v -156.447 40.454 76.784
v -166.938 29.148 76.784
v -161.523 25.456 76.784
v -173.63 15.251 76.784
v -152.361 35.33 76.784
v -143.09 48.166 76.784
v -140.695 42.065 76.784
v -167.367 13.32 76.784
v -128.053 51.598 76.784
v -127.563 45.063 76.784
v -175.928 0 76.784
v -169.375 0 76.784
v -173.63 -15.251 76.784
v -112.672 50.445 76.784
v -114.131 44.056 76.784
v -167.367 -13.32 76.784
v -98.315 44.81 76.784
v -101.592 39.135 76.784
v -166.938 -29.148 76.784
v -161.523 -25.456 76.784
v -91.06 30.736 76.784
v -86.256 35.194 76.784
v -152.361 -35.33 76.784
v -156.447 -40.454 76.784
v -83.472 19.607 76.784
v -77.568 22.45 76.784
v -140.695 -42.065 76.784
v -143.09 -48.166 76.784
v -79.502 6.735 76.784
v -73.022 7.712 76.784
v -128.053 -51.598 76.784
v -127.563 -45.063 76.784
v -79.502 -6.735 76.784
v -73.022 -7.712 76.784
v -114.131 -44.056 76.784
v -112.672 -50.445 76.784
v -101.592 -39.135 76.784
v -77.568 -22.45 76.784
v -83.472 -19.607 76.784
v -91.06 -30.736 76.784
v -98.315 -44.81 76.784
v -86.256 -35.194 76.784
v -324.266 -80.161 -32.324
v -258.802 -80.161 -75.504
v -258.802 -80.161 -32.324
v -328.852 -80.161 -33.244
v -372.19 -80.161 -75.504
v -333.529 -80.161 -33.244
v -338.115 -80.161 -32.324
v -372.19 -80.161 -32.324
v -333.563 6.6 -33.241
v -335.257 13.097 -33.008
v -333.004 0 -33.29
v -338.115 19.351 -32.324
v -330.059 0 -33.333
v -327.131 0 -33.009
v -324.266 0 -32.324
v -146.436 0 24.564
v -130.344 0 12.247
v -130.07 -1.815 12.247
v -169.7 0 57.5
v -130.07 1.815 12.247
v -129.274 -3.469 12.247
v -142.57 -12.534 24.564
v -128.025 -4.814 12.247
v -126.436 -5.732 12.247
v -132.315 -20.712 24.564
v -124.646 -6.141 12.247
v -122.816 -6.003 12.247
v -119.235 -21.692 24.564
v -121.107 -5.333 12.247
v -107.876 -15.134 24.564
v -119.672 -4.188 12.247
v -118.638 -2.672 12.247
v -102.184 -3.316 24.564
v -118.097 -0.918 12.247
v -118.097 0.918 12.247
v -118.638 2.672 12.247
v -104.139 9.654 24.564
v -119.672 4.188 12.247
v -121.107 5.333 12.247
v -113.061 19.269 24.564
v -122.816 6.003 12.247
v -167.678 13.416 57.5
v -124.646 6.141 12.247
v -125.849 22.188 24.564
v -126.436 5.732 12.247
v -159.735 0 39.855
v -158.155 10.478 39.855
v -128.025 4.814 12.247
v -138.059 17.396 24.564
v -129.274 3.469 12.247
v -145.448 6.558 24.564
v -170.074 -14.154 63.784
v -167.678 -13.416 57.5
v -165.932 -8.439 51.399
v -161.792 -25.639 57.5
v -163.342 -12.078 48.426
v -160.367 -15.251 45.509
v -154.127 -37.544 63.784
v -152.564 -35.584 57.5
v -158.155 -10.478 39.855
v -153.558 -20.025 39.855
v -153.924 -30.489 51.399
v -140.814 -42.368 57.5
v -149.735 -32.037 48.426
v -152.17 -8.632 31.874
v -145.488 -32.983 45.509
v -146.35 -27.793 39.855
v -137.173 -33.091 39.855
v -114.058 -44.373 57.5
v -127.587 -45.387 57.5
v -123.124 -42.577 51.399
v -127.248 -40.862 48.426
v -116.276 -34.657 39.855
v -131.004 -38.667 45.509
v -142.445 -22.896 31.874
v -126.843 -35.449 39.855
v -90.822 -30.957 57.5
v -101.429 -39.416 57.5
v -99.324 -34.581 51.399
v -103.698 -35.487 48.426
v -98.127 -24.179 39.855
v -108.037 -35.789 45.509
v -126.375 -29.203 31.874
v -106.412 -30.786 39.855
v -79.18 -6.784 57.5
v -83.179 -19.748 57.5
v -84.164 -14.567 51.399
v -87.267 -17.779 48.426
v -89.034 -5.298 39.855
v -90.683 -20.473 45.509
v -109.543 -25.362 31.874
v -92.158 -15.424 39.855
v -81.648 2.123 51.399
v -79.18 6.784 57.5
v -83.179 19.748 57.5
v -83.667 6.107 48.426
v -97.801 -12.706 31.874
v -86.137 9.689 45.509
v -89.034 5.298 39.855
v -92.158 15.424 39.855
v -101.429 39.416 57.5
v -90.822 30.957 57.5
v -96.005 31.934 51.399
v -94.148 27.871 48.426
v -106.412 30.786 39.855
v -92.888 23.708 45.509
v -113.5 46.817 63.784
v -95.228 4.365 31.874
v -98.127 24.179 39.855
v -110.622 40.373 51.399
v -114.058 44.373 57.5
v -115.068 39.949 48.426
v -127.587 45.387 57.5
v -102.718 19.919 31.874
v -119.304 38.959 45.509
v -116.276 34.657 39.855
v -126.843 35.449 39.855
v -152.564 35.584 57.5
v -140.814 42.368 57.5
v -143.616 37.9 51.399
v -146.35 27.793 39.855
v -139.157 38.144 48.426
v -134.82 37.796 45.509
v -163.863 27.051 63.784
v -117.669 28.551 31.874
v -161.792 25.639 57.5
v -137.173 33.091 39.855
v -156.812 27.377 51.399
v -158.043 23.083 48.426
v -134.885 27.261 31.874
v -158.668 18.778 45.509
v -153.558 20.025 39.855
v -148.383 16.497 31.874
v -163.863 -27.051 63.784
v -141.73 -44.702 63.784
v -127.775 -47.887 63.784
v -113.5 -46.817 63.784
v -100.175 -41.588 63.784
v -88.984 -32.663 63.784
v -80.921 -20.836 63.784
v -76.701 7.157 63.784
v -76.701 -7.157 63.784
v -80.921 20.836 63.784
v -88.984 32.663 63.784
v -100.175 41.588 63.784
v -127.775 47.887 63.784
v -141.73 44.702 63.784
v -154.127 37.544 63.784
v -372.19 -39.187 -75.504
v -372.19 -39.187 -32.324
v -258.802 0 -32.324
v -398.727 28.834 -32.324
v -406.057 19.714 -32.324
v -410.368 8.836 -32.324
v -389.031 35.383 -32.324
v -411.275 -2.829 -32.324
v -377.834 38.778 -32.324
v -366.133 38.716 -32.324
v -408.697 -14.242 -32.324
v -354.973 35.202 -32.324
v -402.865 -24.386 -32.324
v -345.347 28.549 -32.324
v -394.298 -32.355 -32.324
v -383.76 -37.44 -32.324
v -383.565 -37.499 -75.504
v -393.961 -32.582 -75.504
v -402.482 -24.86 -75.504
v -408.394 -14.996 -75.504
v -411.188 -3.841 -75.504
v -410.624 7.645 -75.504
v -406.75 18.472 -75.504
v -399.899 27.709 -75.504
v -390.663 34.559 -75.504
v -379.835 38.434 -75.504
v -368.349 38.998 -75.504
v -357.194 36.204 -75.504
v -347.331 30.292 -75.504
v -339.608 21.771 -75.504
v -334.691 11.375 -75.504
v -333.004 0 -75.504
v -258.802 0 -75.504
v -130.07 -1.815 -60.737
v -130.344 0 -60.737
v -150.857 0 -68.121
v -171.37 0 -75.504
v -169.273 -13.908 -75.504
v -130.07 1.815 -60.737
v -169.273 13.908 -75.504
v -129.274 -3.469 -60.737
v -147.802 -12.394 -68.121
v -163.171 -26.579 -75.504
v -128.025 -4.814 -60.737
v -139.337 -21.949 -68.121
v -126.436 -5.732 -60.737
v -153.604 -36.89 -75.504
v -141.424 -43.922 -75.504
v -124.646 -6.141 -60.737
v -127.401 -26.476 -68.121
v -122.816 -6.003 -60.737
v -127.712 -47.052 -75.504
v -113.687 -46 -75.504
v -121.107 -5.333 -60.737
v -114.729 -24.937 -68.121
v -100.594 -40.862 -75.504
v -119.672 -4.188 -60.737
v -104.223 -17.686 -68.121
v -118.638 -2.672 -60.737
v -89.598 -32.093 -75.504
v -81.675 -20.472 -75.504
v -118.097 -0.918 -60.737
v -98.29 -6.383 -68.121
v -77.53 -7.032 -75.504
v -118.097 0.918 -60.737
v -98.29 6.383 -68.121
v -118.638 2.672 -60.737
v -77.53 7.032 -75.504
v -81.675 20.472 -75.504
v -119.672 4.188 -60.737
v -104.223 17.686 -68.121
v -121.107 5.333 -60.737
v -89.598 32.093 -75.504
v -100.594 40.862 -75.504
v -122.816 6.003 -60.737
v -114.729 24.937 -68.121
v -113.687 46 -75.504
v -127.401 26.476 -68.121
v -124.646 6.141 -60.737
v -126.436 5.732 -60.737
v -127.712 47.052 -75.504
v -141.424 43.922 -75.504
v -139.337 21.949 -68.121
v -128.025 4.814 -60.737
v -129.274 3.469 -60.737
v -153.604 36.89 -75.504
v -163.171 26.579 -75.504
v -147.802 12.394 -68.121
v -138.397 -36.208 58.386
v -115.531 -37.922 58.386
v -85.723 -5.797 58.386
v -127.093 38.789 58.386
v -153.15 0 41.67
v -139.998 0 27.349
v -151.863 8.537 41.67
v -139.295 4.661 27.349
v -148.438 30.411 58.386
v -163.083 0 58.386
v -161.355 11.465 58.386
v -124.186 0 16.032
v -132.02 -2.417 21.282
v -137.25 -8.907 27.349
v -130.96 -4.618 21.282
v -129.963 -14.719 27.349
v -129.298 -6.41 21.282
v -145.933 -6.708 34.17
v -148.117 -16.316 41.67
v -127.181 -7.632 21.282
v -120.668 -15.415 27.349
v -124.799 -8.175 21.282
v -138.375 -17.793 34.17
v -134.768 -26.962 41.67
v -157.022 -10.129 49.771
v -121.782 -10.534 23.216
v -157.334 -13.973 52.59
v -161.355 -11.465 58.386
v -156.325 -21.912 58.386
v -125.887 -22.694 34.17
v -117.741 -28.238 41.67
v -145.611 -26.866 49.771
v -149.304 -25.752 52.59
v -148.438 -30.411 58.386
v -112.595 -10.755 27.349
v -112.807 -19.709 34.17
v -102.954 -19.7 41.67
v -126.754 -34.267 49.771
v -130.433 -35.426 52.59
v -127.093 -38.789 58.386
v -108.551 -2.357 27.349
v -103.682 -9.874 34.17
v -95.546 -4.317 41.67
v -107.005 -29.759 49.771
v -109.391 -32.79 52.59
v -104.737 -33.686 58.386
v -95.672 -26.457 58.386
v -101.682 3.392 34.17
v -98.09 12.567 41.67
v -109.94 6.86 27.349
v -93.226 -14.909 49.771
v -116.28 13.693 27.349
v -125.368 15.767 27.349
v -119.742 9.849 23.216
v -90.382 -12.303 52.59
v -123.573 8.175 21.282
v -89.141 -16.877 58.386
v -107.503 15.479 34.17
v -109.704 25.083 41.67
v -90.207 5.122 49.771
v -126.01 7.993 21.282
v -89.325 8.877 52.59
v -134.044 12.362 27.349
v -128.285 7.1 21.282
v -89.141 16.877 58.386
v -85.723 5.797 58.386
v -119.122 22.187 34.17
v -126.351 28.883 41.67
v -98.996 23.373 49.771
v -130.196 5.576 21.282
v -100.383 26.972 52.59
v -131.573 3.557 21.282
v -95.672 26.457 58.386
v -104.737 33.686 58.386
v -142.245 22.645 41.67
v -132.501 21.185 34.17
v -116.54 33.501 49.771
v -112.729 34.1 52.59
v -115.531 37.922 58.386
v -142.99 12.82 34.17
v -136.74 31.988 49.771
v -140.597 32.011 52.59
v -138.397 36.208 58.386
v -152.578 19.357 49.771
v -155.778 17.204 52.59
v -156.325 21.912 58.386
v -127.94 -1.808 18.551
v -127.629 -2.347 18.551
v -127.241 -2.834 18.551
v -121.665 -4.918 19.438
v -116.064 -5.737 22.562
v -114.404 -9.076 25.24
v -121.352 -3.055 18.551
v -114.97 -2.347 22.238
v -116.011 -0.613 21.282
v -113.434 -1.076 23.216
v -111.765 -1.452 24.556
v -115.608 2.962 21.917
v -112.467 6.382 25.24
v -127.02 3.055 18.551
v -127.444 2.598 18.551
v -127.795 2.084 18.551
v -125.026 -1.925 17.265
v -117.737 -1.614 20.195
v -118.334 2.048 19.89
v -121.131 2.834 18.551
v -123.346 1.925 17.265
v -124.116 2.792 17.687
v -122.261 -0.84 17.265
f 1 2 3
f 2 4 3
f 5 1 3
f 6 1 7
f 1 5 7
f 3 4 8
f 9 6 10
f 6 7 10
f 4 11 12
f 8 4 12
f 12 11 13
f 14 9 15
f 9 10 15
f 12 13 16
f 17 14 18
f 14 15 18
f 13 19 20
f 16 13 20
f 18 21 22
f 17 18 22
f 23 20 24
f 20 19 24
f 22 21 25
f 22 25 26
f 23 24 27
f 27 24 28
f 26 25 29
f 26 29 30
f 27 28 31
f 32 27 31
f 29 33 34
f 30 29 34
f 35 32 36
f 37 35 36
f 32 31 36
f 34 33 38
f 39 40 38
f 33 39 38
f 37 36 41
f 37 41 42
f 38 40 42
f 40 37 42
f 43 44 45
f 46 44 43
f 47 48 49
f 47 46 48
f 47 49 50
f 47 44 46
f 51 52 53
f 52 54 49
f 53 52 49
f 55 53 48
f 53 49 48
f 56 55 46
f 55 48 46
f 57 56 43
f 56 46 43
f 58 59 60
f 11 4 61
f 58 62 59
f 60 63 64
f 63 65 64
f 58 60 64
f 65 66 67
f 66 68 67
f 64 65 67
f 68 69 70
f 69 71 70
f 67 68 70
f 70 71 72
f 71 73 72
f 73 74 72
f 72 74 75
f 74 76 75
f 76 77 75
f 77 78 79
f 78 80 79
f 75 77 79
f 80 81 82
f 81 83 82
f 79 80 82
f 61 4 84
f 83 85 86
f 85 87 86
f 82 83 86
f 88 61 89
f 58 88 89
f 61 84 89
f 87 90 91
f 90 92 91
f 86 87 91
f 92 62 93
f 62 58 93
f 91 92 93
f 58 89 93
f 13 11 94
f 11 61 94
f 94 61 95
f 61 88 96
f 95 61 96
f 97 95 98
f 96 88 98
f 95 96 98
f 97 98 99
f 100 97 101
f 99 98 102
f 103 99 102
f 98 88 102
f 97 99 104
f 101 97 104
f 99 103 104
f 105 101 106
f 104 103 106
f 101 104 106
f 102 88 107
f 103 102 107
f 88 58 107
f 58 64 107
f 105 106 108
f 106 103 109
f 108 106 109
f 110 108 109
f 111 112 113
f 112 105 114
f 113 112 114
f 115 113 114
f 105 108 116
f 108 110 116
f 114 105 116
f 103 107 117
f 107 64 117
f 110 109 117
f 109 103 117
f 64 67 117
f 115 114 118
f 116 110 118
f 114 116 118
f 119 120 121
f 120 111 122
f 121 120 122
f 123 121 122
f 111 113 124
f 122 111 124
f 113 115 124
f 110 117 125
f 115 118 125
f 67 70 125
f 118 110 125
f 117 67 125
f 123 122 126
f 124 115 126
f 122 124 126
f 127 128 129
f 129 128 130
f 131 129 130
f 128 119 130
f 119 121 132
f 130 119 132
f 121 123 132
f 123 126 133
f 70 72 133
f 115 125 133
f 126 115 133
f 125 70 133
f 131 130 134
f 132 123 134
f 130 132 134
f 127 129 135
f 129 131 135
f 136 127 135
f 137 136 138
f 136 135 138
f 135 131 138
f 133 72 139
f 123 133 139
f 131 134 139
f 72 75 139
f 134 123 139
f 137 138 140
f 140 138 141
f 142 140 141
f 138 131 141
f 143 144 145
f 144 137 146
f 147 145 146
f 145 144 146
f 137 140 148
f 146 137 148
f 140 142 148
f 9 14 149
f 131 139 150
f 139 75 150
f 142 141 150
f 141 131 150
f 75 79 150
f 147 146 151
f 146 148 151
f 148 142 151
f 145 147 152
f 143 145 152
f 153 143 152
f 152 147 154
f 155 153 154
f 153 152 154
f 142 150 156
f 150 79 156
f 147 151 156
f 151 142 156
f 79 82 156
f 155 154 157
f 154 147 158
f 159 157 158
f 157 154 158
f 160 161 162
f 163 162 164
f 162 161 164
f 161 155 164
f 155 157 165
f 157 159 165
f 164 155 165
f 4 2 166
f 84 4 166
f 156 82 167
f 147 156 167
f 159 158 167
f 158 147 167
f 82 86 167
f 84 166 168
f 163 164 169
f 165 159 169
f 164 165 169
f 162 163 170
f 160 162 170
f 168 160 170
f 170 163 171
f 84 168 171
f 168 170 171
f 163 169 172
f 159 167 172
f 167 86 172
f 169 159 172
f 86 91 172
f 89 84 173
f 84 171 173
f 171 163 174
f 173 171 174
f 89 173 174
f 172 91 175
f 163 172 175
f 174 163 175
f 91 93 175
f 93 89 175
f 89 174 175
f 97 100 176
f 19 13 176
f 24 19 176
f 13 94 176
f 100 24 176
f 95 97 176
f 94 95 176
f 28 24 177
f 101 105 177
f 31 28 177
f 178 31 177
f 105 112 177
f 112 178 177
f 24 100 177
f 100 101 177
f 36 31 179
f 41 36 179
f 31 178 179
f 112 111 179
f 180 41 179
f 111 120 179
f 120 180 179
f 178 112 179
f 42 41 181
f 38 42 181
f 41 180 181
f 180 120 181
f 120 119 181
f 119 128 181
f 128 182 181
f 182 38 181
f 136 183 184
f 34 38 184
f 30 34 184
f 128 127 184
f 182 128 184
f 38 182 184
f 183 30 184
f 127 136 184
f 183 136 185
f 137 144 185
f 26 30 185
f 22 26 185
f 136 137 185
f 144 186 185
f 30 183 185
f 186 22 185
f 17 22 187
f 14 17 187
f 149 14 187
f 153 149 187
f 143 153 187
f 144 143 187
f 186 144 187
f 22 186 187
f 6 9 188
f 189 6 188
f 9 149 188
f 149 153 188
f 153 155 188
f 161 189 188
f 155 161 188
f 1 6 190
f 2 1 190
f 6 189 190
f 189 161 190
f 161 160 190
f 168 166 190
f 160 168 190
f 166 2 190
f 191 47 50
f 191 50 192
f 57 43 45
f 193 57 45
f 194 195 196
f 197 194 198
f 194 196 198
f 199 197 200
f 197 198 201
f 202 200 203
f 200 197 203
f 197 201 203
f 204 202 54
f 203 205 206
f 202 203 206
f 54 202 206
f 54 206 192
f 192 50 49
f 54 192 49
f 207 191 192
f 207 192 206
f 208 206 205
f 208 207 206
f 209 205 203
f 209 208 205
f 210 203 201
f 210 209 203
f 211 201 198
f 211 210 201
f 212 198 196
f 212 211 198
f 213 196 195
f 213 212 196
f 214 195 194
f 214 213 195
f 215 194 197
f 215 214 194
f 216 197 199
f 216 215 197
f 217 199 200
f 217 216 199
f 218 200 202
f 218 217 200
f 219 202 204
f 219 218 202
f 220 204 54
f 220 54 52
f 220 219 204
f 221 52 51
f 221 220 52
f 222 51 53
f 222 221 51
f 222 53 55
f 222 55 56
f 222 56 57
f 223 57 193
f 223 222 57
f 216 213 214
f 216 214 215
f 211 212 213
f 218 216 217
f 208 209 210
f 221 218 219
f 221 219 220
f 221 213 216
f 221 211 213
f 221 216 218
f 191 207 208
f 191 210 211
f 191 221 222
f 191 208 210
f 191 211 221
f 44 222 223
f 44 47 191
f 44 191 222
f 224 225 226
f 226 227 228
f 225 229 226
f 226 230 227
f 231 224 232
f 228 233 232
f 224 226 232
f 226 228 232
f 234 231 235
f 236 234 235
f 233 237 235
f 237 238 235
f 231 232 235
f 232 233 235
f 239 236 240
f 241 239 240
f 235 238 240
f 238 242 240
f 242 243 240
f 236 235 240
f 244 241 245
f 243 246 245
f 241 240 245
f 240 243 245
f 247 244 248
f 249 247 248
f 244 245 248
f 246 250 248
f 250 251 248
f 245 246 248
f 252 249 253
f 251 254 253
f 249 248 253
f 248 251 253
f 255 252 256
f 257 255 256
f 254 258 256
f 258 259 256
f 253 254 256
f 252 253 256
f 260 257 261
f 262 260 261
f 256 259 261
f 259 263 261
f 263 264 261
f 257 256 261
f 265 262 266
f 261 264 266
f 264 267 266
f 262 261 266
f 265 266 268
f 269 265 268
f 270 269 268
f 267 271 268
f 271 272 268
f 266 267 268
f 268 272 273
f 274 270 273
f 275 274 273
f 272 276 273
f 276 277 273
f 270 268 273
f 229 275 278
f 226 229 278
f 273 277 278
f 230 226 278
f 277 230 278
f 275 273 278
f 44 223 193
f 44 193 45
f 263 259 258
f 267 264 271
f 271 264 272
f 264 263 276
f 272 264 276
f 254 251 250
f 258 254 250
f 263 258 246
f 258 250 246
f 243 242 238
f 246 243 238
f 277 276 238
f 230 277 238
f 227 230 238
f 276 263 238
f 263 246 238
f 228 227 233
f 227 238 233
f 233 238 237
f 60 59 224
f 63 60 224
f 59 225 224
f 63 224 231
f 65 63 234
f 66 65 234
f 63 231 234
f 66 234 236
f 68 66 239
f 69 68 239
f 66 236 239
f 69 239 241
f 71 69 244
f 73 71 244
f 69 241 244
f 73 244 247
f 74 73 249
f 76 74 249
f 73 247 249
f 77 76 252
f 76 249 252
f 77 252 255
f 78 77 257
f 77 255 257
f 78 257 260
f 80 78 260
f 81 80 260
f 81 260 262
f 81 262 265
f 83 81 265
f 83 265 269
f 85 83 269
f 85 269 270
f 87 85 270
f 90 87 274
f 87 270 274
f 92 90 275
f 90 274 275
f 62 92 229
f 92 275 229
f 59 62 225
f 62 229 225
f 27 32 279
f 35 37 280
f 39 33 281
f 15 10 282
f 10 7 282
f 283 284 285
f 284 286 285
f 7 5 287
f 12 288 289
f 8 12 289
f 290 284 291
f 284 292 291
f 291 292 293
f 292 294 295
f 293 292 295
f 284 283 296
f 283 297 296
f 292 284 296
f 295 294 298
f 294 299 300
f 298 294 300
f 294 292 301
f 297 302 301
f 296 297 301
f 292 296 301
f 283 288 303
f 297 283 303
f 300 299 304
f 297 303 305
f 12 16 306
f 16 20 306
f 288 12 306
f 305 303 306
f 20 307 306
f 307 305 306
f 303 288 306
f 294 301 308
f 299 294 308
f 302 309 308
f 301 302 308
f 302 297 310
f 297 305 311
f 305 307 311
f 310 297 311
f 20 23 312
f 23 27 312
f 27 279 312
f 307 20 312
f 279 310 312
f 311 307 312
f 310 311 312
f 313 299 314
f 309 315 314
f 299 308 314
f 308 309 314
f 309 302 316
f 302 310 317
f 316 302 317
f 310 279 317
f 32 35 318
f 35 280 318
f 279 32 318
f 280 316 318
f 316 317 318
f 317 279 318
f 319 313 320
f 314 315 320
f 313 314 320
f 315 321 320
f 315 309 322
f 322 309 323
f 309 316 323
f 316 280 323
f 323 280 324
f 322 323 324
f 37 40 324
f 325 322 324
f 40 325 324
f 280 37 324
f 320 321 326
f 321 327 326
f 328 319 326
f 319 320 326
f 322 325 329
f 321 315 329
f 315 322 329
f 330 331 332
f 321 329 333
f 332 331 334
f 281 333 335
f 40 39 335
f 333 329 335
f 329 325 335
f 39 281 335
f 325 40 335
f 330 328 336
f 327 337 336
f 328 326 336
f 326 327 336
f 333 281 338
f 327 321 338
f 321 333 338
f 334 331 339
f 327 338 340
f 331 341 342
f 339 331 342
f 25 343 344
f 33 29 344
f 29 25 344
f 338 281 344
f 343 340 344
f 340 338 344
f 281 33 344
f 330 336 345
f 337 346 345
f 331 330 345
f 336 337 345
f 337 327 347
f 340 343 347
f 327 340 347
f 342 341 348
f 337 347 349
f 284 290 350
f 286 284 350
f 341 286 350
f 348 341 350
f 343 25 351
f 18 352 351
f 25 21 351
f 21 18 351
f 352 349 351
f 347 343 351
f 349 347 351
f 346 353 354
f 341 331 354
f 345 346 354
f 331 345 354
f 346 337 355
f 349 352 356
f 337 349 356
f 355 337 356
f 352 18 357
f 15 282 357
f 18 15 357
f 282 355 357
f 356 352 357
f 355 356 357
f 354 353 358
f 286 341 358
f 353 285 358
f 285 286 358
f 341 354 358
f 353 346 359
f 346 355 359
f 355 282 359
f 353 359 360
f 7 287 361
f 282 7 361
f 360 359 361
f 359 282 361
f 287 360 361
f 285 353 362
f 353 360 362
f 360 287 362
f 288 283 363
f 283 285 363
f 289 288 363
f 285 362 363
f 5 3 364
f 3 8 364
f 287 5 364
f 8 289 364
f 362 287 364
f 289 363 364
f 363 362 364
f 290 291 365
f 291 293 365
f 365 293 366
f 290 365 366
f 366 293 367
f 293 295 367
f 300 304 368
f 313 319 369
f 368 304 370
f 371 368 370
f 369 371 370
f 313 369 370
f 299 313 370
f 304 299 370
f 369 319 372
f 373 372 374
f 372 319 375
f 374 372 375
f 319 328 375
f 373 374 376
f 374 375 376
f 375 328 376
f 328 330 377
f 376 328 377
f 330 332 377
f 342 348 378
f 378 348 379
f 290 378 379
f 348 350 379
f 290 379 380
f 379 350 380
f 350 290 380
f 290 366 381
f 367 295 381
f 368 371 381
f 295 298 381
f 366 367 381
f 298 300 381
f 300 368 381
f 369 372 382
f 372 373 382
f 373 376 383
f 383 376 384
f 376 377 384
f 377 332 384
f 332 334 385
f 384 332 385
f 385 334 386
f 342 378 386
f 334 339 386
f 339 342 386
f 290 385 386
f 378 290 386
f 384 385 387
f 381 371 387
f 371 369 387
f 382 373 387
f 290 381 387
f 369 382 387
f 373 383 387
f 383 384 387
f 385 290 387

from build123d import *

# Parameters (mm, degrees)
F3_DEPTH = 43.18
F4_R     = 23.6600255422
F5_DEPTH = 198.12


with BuildPart() as f1:
    # F0 (on Front) → F1 (revolve)
    with BuildSketch(Plane.XZ):
        with BuildLine():
            Line((-171.3695186251, -75.5041107695), (-124.186059868, -75.5041107695))
            Line((-124.186059868, -75.5041107695), (-124.186059868, 16.0320485777))
            ThreePointArc((-124.186059868, 16.0320485777), (-153.1499751292, 41.670309623), (-169.3749281483, 76.7841205271))
            Line((-169.3749281483, 76.7841205271), (-175.9284700741, 76.7841205271))
            ThreePointArc((-175.9284700741, 76.7841205271), (-159.7346839442, 39.8546698346), (-130.3438502425, 12.2466649811))
            Line((-130.3438502425, 12.2466649811), (-130.3438502425, -60.7368963593))
            Line((-130.3438502425, -60.7368963593), (-171.3695186251, -75.5041107695))
        make_face()
    revolve(axis=Axis((-124.186059868, 0, -29.7360310959), (0, 0, 1)))


with BuildPart() as f3:
    # F2 (on face) → F3 (new body)
    with BuildSketch(Plane(origin=(0, 0, -75.5041107695), x_dir=(1, 0, 0), z_dir=(0, 0, -1))):
        with BuildLine():
            Line((-372.190207243, 39.1865656481), (-372.190207243, 0))
            Line((-372.190207243, 0), (-333.0036415949, 0))
            ThreePointArc((-333.0036415949, 0), (-344.4811209418, 27.7090863012), (-372.190207243, 39.1865656481))
        make_face()
        with BuildLine():
            Line((-333.0036415949, 0), (-372.190207243, 0))
            Line((-372.190207243, 0), (-372.190207243, 39.1865656481))
            ThreePointArc((-372.190207243, 39.1865656481), (-399.8992935441, -27.7090863012), (-333.0036415949, 0))
        make_face()
        with BuildLine():
            ThreePointArc((-372.190207243, 39.1865656481), (-344.4811209418, 27.7090863012), (-333.0036415949, 0))
            Line((-333.0036415949, 0), (-258.8019967079, 0))
            Line((-258.8019967079, 0), (-258.8019967079, 80.160908401))
            Line((-258.8019967079, 80.160908401), (-372.190207243, 80.160908401))
            Line((-372.190207243, 80.160908401), (-372.190207243, 39.1865656481))
        make_face()
    extrude(amount=-F3_DEPTH)

    # F4 (on face) → F5 (cut)
    with BuildSketch(Plane.XZ.offset(80.160908401)):
        with Locations((-331.190764904, -9.700011462)):
            Circle(F4_R)
    extrude(amount=-F5_DEPTH, mode=Mode.SUBTRACT)


solid = Compound([f1.part, f3.part])
